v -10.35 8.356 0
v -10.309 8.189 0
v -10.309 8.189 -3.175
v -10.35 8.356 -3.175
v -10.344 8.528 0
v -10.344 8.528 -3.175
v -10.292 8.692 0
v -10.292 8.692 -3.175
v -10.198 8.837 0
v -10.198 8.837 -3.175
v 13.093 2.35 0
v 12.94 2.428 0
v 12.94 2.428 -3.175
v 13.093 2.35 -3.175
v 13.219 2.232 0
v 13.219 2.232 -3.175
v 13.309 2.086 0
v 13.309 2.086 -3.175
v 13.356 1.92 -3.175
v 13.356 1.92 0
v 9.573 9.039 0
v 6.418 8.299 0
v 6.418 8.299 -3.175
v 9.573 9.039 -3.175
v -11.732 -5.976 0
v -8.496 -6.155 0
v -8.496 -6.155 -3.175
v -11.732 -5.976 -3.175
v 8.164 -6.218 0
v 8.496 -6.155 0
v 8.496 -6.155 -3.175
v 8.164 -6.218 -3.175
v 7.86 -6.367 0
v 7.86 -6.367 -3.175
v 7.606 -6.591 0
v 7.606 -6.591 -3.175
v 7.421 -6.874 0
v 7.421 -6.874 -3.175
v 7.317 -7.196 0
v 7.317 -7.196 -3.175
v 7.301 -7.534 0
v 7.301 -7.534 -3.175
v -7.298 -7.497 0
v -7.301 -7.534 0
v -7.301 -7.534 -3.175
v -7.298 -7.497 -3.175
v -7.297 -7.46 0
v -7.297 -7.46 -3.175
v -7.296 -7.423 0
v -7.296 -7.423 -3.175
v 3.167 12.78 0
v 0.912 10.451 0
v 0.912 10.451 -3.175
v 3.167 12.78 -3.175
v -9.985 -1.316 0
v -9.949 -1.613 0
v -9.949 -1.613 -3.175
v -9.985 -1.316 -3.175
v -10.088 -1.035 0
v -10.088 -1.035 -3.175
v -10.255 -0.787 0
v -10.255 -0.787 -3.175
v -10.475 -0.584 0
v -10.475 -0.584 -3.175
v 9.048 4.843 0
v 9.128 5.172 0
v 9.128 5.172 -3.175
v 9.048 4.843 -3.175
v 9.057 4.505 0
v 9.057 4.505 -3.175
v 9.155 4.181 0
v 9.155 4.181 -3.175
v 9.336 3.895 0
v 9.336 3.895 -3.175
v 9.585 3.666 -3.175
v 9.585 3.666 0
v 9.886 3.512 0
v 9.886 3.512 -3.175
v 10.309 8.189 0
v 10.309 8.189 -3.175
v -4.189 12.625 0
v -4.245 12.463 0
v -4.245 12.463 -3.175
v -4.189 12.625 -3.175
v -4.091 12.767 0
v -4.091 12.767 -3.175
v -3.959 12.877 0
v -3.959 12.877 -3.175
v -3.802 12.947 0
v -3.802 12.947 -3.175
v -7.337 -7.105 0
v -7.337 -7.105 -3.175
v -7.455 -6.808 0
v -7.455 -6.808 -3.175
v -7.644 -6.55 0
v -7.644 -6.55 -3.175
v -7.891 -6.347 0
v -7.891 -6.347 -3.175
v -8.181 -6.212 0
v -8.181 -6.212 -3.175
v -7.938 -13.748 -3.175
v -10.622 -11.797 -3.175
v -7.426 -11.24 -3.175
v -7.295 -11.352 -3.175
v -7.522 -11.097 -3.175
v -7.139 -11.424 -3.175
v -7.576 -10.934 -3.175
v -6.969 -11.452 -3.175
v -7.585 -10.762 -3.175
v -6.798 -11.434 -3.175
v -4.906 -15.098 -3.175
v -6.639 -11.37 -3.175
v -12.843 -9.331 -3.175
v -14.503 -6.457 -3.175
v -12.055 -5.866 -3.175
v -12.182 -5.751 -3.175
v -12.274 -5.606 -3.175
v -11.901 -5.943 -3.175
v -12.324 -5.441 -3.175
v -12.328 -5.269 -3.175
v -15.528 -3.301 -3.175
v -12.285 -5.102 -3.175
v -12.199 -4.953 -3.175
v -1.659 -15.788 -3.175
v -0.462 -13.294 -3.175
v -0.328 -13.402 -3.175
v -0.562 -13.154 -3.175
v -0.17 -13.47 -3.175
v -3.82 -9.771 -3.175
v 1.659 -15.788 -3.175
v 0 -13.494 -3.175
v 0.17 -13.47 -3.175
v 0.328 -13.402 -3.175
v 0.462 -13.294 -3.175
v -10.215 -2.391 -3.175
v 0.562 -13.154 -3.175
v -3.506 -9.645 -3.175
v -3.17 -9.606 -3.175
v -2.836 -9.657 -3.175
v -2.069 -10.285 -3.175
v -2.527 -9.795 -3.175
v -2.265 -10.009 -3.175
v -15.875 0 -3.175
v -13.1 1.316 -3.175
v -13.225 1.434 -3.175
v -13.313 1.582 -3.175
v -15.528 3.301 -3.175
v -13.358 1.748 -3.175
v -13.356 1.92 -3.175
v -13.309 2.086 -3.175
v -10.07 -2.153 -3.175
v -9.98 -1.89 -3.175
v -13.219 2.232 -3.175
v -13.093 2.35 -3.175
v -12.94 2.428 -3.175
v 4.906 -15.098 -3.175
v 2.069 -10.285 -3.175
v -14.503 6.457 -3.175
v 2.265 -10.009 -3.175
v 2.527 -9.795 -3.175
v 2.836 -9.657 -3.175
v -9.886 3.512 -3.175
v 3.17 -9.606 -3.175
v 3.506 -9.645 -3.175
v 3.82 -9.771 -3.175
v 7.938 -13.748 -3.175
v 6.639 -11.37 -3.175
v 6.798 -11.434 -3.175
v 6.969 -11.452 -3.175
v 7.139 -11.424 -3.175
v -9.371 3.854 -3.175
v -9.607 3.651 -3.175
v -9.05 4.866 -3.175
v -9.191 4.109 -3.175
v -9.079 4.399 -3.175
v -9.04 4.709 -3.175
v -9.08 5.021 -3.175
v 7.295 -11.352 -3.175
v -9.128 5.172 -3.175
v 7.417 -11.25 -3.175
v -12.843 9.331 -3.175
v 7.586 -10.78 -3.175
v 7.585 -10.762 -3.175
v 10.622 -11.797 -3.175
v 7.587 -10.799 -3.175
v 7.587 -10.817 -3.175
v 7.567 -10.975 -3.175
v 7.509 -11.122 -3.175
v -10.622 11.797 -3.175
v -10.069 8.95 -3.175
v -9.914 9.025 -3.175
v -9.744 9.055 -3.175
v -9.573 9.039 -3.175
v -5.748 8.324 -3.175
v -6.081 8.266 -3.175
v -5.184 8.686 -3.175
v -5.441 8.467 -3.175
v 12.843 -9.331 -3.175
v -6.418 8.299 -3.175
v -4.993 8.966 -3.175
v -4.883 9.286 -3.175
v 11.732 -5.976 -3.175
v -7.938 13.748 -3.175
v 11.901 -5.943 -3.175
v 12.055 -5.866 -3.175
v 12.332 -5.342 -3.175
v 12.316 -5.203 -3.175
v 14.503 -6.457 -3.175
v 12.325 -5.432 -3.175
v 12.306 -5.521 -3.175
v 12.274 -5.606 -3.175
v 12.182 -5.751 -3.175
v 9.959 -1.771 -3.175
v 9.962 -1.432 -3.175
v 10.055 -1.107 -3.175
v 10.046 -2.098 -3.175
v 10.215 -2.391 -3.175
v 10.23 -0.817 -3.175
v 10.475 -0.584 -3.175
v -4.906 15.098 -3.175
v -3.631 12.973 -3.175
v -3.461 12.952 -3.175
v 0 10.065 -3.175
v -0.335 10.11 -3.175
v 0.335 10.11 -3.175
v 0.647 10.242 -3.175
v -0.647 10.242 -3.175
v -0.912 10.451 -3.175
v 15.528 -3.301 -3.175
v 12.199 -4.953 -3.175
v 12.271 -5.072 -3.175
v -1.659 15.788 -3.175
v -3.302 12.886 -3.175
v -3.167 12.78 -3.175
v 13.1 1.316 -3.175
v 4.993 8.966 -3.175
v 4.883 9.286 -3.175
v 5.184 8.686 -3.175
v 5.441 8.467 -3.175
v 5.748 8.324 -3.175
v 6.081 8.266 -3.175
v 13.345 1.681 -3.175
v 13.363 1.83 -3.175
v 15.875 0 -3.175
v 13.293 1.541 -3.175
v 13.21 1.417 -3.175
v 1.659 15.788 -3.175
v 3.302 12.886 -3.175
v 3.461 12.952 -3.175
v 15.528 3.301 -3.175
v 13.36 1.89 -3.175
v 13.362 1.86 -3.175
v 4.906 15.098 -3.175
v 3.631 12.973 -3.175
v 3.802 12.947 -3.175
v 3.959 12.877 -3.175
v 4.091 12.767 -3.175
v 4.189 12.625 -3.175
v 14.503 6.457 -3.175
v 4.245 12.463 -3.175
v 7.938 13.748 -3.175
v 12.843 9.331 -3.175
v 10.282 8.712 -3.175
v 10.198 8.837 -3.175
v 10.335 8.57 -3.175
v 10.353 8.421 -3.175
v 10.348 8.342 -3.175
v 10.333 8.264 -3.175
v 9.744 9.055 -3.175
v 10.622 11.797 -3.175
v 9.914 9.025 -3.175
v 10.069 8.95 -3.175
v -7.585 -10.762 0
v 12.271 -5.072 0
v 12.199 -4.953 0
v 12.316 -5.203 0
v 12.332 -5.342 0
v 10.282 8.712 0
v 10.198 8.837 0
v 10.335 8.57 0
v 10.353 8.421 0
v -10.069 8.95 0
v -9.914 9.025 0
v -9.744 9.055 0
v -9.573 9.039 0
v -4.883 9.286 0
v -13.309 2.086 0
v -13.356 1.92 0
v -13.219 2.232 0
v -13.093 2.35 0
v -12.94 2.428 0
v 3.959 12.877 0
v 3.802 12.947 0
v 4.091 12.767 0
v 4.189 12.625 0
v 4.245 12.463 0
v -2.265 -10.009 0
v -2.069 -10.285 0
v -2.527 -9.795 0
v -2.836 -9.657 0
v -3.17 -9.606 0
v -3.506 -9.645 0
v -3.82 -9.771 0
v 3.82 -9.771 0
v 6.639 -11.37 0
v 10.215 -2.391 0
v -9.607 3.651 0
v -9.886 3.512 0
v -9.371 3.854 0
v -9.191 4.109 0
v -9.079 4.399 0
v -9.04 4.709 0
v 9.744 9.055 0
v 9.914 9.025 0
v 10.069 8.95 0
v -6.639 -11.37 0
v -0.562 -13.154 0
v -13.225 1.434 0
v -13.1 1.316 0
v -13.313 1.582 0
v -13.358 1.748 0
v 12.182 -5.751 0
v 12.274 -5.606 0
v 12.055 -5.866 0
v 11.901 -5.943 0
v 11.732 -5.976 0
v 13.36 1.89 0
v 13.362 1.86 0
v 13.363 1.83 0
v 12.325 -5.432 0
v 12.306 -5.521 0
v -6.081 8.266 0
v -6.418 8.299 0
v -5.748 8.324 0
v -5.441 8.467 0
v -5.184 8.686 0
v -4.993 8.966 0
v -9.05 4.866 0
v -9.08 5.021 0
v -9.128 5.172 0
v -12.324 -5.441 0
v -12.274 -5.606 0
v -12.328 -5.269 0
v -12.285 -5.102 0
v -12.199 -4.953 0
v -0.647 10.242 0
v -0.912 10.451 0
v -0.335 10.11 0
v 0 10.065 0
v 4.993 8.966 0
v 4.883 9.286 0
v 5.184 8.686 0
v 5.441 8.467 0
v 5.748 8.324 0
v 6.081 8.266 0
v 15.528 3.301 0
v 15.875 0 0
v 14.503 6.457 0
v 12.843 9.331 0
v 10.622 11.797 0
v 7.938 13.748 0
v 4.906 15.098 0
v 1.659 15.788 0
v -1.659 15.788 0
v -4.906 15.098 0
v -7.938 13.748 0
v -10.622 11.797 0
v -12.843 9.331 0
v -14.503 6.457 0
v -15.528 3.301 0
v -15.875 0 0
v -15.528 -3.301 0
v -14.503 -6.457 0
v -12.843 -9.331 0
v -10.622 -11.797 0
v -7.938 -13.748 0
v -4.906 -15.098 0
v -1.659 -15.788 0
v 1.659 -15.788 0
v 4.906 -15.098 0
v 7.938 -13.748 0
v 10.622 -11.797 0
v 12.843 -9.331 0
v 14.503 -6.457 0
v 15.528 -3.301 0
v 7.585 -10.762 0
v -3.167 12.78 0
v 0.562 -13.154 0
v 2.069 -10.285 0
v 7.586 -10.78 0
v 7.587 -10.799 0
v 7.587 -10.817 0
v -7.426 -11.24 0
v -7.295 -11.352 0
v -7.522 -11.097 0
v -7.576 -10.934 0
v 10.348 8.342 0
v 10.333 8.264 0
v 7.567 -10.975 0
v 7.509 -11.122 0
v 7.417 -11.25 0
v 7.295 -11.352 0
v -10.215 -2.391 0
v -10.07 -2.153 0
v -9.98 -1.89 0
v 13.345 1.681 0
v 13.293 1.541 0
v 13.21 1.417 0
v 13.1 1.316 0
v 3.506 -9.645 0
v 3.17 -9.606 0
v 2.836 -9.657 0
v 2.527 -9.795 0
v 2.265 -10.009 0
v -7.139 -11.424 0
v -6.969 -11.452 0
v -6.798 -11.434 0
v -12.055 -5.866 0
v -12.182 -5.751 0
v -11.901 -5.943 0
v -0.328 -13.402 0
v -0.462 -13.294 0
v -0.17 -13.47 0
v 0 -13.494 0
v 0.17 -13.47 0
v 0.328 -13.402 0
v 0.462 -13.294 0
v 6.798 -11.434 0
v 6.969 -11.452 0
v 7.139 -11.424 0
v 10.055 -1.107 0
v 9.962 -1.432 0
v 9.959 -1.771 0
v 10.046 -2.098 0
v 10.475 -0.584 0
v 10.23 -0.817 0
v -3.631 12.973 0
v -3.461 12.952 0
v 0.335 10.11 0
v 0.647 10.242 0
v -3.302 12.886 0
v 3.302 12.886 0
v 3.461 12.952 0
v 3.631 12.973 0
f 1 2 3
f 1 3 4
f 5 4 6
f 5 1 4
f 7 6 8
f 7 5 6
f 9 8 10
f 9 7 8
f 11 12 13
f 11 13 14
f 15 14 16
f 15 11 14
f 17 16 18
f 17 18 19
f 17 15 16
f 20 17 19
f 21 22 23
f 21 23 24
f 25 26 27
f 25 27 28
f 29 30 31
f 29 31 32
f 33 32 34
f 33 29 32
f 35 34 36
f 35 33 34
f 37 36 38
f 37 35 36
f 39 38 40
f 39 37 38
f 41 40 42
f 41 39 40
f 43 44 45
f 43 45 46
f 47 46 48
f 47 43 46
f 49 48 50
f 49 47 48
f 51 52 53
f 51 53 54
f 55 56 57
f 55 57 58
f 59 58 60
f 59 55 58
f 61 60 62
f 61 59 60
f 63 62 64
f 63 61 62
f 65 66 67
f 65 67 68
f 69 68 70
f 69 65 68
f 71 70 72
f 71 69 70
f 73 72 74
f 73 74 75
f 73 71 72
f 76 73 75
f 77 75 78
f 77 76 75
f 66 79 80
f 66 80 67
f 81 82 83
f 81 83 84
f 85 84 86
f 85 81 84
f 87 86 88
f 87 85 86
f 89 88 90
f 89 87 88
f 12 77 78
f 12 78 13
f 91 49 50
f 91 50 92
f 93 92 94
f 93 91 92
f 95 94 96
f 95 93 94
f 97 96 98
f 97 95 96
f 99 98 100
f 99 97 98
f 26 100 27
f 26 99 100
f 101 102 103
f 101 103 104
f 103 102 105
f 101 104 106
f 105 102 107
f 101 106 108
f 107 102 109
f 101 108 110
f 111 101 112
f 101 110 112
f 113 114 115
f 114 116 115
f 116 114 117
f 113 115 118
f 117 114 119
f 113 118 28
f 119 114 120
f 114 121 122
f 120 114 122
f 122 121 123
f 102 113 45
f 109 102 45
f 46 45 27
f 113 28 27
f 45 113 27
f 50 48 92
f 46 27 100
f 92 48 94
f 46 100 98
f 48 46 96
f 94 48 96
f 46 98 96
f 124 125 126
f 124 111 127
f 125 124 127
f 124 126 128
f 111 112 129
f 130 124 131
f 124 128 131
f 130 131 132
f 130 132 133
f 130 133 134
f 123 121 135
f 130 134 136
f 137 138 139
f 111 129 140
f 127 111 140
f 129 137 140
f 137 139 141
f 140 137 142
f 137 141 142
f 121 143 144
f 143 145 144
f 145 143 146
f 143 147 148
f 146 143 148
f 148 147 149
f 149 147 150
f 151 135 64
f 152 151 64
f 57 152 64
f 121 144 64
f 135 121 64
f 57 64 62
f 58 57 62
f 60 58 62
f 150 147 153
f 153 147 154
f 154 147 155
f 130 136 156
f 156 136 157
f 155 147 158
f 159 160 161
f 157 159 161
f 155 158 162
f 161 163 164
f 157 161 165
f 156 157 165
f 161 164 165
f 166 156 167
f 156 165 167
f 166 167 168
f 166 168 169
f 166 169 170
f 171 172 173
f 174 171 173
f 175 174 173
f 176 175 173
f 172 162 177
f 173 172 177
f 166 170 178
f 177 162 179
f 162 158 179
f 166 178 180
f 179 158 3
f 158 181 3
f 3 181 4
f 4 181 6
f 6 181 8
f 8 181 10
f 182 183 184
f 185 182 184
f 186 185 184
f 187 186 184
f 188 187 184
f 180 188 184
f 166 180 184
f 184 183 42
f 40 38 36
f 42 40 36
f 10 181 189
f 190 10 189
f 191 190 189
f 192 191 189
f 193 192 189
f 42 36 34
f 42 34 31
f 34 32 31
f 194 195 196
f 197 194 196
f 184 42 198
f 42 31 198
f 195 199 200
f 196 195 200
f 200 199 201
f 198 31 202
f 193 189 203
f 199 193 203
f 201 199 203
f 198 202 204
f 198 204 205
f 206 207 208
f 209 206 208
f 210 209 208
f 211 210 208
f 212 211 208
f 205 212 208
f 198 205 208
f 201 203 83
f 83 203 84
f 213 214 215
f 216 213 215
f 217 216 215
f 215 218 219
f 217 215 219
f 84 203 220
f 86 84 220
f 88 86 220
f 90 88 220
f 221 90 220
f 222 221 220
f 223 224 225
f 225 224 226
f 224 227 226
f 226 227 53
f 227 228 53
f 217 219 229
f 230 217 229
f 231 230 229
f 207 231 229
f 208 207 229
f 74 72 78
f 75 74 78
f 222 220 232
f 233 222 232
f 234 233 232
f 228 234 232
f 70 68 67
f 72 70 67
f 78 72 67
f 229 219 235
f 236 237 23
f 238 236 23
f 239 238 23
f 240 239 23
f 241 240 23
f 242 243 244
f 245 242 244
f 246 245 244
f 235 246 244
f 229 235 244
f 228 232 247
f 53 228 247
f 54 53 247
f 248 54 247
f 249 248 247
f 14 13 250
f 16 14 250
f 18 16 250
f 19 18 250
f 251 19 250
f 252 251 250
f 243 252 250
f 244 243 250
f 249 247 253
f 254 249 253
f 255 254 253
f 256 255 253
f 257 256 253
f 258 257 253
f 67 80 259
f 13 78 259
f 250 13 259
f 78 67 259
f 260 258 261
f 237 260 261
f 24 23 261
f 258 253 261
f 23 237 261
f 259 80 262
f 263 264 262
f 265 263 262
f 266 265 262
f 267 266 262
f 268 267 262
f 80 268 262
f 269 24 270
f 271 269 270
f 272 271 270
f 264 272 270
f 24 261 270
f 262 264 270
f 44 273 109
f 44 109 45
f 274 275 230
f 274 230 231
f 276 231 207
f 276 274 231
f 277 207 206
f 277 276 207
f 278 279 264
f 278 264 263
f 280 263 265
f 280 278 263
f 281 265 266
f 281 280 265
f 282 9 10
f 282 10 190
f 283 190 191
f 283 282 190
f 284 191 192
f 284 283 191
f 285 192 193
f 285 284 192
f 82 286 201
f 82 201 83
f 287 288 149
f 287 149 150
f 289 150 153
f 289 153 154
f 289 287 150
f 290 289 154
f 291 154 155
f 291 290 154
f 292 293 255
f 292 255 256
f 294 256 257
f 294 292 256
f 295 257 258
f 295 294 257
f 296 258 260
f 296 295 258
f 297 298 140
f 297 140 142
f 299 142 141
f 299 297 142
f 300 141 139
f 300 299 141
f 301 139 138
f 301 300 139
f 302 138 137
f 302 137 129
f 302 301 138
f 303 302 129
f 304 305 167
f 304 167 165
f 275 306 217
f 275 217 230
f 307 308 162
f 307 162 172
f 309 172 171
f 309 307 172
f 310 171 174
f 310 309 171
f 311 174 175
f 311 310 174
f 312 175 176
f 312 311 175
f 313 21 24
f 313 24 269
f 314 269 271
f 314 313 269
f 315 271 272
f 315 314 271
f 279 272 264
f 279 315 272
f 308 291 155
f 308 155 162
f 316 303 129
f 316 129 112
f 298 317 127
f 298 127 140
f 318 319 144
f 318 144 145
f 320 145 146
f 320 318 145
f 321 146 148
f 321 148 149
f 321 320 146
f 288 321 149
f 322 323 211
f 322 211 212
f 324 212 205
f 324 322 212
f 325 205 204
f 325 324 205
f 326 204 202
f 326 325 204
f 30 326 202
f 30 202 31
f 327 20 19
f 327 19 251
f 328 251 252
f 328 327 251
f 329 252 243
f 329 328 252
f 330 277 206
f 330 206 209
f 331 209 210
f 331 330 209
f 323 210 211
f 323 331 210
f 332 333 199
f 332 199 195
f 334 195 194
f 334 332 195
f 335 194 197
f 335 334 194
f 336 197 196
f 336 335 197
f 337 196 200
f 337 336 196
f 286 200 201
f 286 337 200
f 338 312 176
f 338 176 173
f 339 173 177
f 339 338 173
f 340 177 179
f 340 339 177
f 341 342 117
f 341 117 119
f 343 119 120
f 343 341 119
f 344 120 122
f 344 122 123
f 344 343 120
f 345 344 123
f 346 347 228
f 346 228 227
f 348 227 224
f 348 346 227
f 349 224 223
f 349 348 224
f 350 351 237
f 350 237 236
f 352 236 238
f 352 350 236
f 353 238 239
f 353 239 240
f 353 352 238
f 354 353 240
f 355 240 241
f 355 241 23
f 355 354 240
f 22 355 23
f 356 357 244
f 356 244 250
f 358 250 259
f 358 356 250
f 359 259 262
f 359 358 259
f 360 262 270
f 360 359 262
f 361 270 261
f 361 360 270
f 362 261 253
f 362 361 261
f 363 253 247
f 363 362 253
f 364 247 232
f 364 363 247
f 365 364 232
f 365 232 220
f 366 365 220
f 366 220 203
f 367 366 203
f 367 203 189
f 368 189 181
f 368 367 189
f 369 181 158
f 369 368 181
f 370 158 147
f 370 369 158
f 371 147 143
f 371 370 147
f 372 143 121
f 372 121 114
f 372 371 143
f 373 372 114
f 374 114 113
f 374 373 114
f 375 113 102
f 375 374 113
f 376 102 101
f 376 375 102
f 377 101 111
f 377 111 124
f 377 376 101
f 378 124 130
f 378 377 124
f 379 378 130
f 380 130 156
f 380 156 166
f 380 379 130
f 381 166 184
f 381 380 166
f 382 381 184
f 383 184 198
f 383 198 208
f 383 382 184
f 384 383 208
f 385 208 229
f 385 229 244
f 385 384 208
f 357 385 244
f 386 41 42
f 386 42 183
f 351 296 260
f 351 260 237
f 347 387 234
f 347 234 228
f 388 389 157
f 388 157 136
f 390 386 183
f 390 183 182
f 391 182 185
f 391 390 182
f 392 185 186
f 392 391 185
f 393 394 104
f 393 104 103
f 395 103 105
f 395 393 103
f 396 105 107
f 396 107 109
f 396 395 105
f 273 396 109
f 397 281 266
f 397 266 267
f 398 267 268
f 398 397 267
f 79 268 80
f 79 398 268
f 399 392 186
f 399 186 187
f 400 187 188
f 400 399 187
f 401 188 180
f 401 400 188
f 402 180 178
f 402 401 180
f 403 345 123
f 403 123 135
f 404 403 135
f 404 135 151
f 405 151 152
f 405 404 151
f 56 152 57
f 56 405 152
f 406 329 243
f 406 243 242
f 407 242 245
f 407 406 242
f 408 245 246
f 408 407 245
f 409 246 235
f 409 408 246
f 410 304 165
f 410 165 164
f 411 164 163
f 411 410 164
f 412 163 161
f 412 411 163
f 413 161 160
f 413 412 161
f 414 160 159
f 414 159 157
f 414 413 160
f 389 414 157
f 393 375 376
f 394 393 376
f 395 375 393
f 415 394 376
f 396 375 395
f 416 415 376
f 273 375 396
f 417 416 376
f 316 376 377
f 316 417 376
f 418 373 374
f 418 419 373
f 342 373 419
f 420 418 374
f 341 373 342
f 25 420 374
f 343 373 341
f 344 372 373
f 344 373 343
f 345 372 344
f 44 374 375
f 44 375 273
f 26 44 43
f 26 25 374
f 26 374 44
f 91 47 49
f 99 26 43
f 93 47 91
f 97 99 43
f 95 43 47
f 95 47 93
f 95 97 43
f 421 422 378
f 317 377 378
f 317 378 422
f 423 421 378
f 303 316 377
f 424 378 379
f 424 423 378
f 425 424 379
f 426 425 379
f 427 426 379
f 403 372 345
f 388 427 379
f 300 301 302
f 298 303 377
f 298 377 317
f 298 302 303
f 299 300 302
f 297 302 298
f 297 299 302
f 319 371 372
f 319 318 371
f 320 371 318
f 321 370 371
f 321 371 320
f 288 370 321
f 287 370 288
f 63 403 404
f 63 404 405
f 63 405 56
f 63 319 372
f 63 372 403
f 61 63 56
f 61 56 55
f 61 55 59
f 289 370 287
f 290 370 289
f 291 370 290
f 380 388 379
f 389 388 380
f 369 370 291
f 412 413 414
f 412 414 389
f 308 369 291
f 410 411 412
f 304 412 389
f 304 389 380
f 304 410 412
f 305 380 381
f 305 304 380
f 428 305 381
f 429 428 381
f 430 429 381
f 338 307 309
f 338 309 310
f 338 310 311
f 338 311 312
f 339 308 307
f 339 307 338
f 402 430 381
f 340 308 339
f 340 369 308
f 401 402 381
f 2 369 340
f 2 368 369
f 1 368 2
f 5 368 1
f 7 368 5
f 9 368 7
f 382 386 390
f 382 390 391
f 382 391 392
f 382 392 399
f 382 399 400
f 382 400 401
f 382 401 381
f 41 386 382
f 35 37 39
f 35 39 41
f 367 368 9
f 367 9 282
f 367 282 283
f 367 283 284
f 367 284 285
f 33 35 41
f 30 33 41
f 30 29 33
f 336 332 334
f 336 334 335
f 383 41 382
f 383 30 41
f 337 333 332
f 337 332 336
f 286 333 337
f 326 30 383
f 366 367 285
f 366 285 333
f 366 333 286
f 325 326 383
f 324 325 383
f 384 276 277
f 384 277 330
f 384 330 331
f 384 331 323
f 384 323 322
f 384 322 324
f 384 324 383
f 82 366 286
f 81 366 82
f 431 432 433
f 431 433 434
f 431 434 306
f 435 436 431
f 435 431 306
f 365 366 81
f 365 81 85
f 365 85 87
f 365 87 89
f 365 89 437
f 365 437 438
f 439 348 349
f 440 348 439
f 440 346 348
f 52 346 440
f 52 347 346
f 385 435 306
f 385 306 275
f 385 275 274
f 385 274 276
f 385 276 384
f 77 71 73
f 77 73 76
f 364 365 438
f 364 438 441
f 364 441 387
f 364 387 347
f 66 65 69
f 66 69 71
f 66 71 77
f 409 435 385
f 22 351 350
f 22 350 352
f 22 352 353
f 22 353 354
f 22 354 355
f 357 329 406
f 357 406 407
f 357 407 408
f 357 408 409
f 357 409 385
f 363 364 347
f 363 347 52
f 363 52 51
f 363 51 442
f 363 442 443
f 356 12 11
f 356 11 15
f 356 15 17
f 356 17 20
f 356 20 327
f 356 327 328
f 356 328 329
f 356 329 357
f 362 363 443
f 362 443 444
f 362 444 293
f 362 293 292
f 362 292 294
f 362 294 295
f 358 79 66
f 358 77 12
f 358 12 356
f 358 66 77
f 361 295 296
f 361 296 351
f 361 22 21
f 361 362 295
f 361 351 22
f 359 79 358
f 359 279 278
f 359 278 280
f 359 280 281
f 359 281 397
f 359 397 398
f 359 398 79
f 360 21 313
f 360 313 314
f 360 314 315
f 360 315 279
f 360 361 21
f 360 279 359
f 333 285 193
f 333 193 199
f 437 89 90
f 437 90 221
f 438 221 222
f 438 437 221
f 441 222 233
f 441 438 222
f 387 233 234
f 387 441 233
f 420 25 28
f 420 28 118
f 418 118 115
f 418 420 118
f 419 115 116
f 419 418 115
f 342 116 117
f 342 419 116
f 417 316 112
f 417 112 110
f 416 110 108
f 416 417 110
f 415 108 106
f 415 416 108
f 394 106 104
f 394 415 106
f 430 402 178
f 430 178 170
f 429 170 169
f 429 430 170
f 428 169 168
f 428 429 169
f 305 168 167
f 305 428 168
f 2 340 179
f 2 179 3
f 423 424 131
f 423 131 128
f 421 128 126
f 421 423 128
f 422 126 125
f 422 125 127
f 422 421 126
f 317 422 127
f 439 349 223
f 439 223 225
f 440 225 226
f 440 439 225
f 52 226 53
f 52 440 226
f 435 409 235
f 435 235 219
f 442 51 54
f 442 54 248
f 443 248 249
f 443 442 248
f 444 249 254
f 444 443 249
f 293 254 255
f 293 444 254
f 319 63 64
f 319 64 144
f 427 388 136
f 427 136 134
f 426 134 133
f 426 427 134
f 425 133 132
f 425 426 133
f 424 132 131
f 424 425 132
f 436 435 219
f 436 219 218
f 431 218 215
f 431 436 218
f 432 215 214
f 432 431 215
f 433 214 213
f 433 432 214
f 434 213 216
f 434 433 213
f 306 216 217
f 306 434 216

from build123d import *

# Parameters (mm, degrees)
F0_R     = 15.875
F1_DEPTH = 3.175


with BuildPart() as f1:
    # F0 (on Top) → F1 (new body)
    with BuildSketch(Plane.XY):
        Circle(F0_R)
        with BuildLine():
            ThreePointArc((0, 13.49375), (1.920361, 13.356403), (3.801629, 12.947158))
            ThreePointArc((3.801629, 12.947158), (7.295272, 11.351665), (10.197896, 8.836527))
            ThreePointArc((10.197896, 8.836527), (12.274347, 5.605506), (13.356403, 1.920361))
            ThreePointArc((13.356403, 1.920361), (13.459369, 0.962633), (13.49375, 0))
            ThreePointArc((13.49375, 0), (13.185376, -2.868303), (12.274347, -5.605506))
            ThreePointArc((12.274347, -5.605506), (10.197896, -8.836527), (7.295272, -11.351665))
            ThreePointArc((7.295272, -11.351665), (3.801629, -12.947158), (0, -13.49375))
            ThreePointArc((0, -13.49375), (-3.801629, -12.947158), (-7.295272, -11.351665))
            ThreePointArc((-7.295272, -11.351665), (-10.197896, -8.836527), (-12.274347, -5.605506))
            ThreePointArc((-12.274347, -5.605506), (-13.356403, -1.920361), (-13.356403, 1.920361))
            ThreePointArc((-13.356403, 1.920361), (-12.274347, 5.605506), (-10.197896, 8.836527))
            ThreePointArc((-10.197896, 8.836527), (-7.295272, 11.351665), (-3.801629, 12.947158))
            ThreePointArc((-3.801629, 12.947158), (-1.920361, 13.356403), (0, 13.49375))
        make_face(mode=Mode.SUBTRACT)
        with BuildLine():
            ThreePointArc((-4.245319, 12.462805), (-4.090966, 12.766808), (-3.801629, 12.947158))
            ThreePointArc((-3.801629, 12.947158), (-7.295272, 11.351665), (-10.197896, 8.836527))
            ThreePointArc((-10.197896, 8.836527), (-9.913648, 9.024797), (-9.572997, 9.038914))
            Line((-9.572997, 9.038914), (-6.418023, 8.298951))
            ThreePointArc((-6.418023, 8.298951), (-6.916891, 10.530686), (-4.858029, 9.535398))
            ThreePointArc((-4.858029, 9.535398), (-4.864249, 9.409858), (-4.882848, 9.285548))
            Line((-4.882848, 9.285548), (-4.245319, 12.462805))
        make_face()
        with BuildLine():
            ThreePointArc((-6.418023, 8.298951), (-5.441415, 8.467007), (-4.882848, 9.285548))
            ThreePointArc((-4.882848, 9.285548), (-4.864249, 9.409858), (-4.858029, 9.535398))
            ThreePointArc((-4.858029, 9.535398), (-6.916891, 10.530686), (-6.418023, 8.298951))
        make_face()
        with BuildLine():
            ThreePointArc((-13.100136, 1.315559), (-13.312545, 1.58225), (-13.356403, 1.920361))
            ThreePointArc((-13.356403, 1.920361), (-13.356403, -1.920361), (-12.274347, -5.605506))
            ThreePointArc((-12.274347, -5.605506), (-12.327522, -5.268735), (-12.198852, -4.953004))
            Line((-12.198852, -4.953004), (-10.215134, -2.390531))
            ThreePointArc((-10.215134, -2.390531), (-12.476452, -1.793843), (-10.47484, -0.584239))
            Line((-10.47484, -0.584239), (-13.100136, 1.315559))
        make_face()
        with BuildLine():
            ThreePointArc((-9.949379, -1.613103), (-10.088347, -1.035463), (-10.47484, -0.584239))
            ThreePointArc((-10.47484, -0.584239), (-12.476452, -1.793843), (-10.215134, -2.390531))
            ThreePointArc((-10.215134, -2.390531), (-10.017653, -2.023901), (-9.949379, -1.613103))
        make_face()
        with BuildLine():
            ThreePointArc((-10.309291, 8.189186), (-10.343797, 8.528379), (-10.197896, 8.836527))
            ThreePointArc((-10.197896, 8.836527), (-12.274347, 5.605506), (-13.356403, 1.920361))
            ThreePointArc((-13.356403, 1.920361), (-13.219065, 2.232419), (-12.940124, 2.428465))
            Line((-12.940124, 2.428465), (-9.885936, 3.511676))
            ThreePointArc((-9.885936, 3.511676), (-11.465684, 5.236202), (-9.127859, 5.171633))
            Line((-9.127859, 5.171633), (-10.309291, 8.189186))
        make_face()
        with BuildLine():
            ThreePointArc((-9.040451, 4.708625), (-9.062495, 4.944219), (-9.127859, 5.171633))
            ThreePointArc((-9.127859, 5.171633), (-11.465684, 5.236202), (-9.885936, 3.511676))
            ThreePointArc((-9.885936, 3.511676), (-9.273139, 3.975902), (-9.040451, 4.708625))
        make_face()
        with BuildLine():
            Line((0, 12.60475), (0, 13.49375))
            ThreePointArc((0, 13.49375), (-1.920361, 13.356403), (-3.801629, 12.947158))
            ThreePointArc((-3.801629, 12.947158), (-3.460718, 12.951865), (-3.166512, 12.779572))
            Line((-3.166512, 12.779572), (-0.912433, 10.451367))
            ThreePointArc((-0.912433, 10.451367), (-1.169358, 11.830231), (0, 12.60475))
        make_face()
        with BuildLine():
            ThreePointArc((1.27, 11.33475), (0.898026, 12.232776), (0, 12.60475))
            Line((0, 12.60475), (0, 10.06475))
            ThreePointArc((0, 10.06475), (0.495481, 10.165392), (0.912433, 10.451367))
            ThreePointArc((0.912433, 10.451367), (1.177219, 10.858247), (1.27, 11.33475))
        make_face()
        with BuildLine():
            ThreePointArc((3.166512, 12.779572), (3.460718, 12.951865), (3.801629, 12.947158))
            ThreePointArc((3.801629, 12.947158), (1.920361, 13.356403), (0, 13.49375))
            Line((0, 13.49375), (0, 12.60475))
            ThreePointArc((0, 12.60475), (0.898026, 12.232776), (1.27, 11.33475))
            ThreePointArc((1.27, 11.33475), (1.177219, 10.858247), (0.912433, 10.451367))
            Line((0.912433, 10.451367), (3.166512, 12.779572))
        make_face()
        with BuildLine():
            Line((0, 10.06475), (0, 12.60475))
            ThreePointArc((0, 12.60475), (-1.169358, 11.830231), (-0.912433, 10.451367))
            ThreePointArc((-0.912433, 10.451367), (-0.495481, 10.165392), (0, 10.06475))
        make_face()
        with BuildLine():
            ThreePointArc((10.197896, 8.836527), (7.295272, 11.351665), (3.801629, 12.947158))
            ThreePointArc((3.801629, 12.947158), (4.090966, 12.766808), (4.245319, 12.462805))
            Line((4.245319, 12.462805), (4.882848, 9.285548))
            ThreePointArc((4.882848, 9.285548), (6.002488, 10.799178), (7.398029, 9.535398))
            ThreePointArc((7.398029, 9.535398), (7.123316, 8.746536), (6.418023, 8.298951))
            Line((6.418023, 8.298951), (9.572997, 9.038914))
            ThreePointArc((9.572997, 9.038914), (9.913648, 9.024797), (10.197896, 8.836527))
        make_face()
        with BuildLine():
            ThreePointArc((7.398029, 9.535398), (6.002488, 10.799178), (4.882848, 9.285548))
            ThreePointArc((4.882848, 9.285548), (5.441415, 8.467006), (6.418023, 8.298951))
            ThreePointArc((6.418023, 8.298951), (7.123316, 8.746536), (7.398029, 9.535398))
        make_face()
        with BuildLine():
            ThreePointArc((13.356403, 1.920361), (12.274347, 5.605506), (10.197896, 8.836527))
            ThreePointArc((10.197896, 8.836527), (10.312958, 8.6426), (10.352995, 8.420691))
            ThreePointArc((10.352995, 8.420691), (10.341973, 8.302894), (10.309291, 8.189187))
            Line((10.309291, 8.189187), (9.127859, 5.171633))
            ThreePointArc((9.127859, 5.171633), (10.546044, 5.956582), (11.580451, 4.708625))
            ThreePointArc((11.580451, 4.708625), (11.043174, 3.671313), (9.885936, 3.511676))
            Line((9.885936, 3.511676), (12.940124, 2.428466))
            ThreePointArc((12.940124, 2.428466), (13.219065, 2.23242), (13.356403, 1.920361))
        make_face()
        with BuildLine():
            ThreePointArc((9.127859, 5.171633), (9.155219, 4.181048), (9.885936, 3.511676))
            ThreePointArc((9.885936, 3.511676), (11.043174, 3.671313), (11.580451, 4.708625))
            ThreePointArc((11.580451, 4.708625), (10.546044, 5.956582), (9.127859, 5.171633))
        make_face()
        with BuildLine():
            ThreePointArc((13.49375, 0), (13.459369, 0.962633), (13.356403, 1.920361))
            ThreePointArc((13.356403, 1.920361), (13.361249, 1.875291), (13.362866, 1.829991))
            ThreePointArc((13.362866, 1.829991), (13.293382, 1.541171), (13.100136, 1.315559))
            Line((13.100136, 1.315559), (10.47484, -0.584239))
            ThreePointArc((10.47484, -0.584239), (11.797019, -0.482072), (12.489379, -1.613103))
            ThreePointArc((12.489379, -1.613103), (11.630177, -2.814829), (10.215134, -2.390531))
            Line((10.215134, -2.390531), (12.198853, -4.953004))
            ThreePointArc((12.198853, -4.953004), (12.297593, -5.136319), (12.33173, -5.341718))
            ThreePointArc((12.33173, -5.341718), (12.317219, -5.476697), (12.274347, -5.605506))
            ThreePointArc((12.274347, -5.605506), (13.185376, -2.868303), (13.49375, 0))
        make_face()
        with BuildLine():
            ThreePointArc((12.489379, -1.613103), (11.797019, -0.482072), (10.47484, -0.584239))
            ThreePointArc((10.47484, -0.584239), (9.962305, -1.432363), (10.215134, -2.390531))
            ThreePointArc((10.215134, -2.390531), (11.630177, -2.814829), (12.489379, -1.613103))
        make_face()
        with BuildLine():
            ThreePointArc((7.295272, -11.351665), (10.197896, -8.836527), (12.274347, -5.605506))
            ThreePointArc((12.274347, -5.605506), (12.054655, -5.866232), (11.73178, -5.97575))
            Line((11.73178, -5.97575), (8.496133, -6.154619))
            ThreePointArc((8.496133, -6.154619), (9.439122, -6.500206), (9.836232, -7.422683))
            ThreePointArc((9.836232, -7.422683), (8.621825, -8.691465), (7.301099, -7.533761))
            Line((7.301099, -7.533761), (7.584532, -10.76193))
            ThreePointArc((7.584532, -10.76193), (7.586357, -10.789673), (7.586965, -10.817469))
            ThreePointArc((7.586965, -10.817469), (7.509291, -11.121792), (7.295272, -11.351665))
        make_face()
        with BuildLine():
            ThreePointArc((9.836232, -7.422683), (9.439122, -6.500206), (8.496133, -6.154619))
            ThreePointArc((8.496133, -6.154619), (7.606431, -6.59101), (7.301099, -7.533761))
            ThreePointArc((7.301099, -7.533761), (8.621825, -8.691465), (9.836232, -7.422683))
        make_face()
        with BuildLine():
            ThreePointArc((0, -13.49375), (3.801629, -12.947158), (7.295272, -11.351665))
            ThreePointArc((7.295272, -11.351665), (6.969497, -11.452227), (6.638667, -11.3698))
            Line((6.638667, -11.3698), (3.819964, -9.770951))
            ThreePointArc((3.819964, -9.770951), (4.290792, -10.236425), (4.463368, -10.875613))
            ThreePointArc((4.463368, -10.875613), (2.889251, -12.108663), (2.069017, -10.285075))
            Line((2.069017, -10.285075), (0.562176, -13.154019))
            ThreePointArc((0.562176, -13.154019), (0.328428, -13.402221), (0, -13.49375))
        make_face()
        with BuildLine():
            ThreePointArc((4.463368, -10.875613), (4.290792, -10.236425), (3.819964, -9.770951))
            ThreePointArc((3.819964, -9.770951), (2.835568, -9.657057), (2.069017, -10.285075))
            ThreePointArc((2.069017, -10.285075), (2.889251, -12.108663), (4.463368, -10.875613))
        make_face()
        with BuildLine():
            ThreePointArc((-6.638667, -11.3698), (-6.969497, -11.452227), (-7.295272, -11.351665))
            ThreePointArc((-7.295272, -11.351665), (-3.801629, -12.947158), (0, -13.49375))
            ThreePointArc((0, -13.49375), (-0.328427, -13.402221), (-0.562175, -13.154019))
            Line((-0.562175, -13.154019), (-2.069017, -10.285075))
            ThreePointArc((-2.069017, -10.285075), (-1.960318, -10.571496), (-1.923368, -10.875613))
            ThreePointArc((-1.923368, -10.875613), (-3.832556, -11.973036), (-3.819964, -9.770951))
            Line((-3.819964, -9.770951), (-6.638667, -11.3698))
        make_face()
        with BuildLine():
            ThreePointArc((-2.069017, -10.285075), (-2.835568, -9.657057), (-3.819964, -9.770951))
            ThreePointArc((-3.819964, -9.770951), (-3.832556, -11.973036), (-1.923368, -10.875613))
            ThreePointArc((-1.923368, -10.875613), (-1.960318, -10.571496), (-2.069017, -10.285075))
        make_face()
        with BuildLine():
            ThreePointArc((-11.73178, -5.97575), (-12.054655, -5.866232), (-12.274347, -5.605506))
            ThreePointArc((-12.274347, -5.605506), (-10.197896, -8.836527), (-7.295272, -11.351665))
            ThreePointArc((-7.295272, -11.351665), (-7.522078, -11.097104), (-7.584532, -10.76193))
            Line((-7.584532, -10.76193), (-7.301099, -7.533761))
            ThreePointArc((-7.301099, -7.533761), (-9.526034, -8.254356), (-8.496133, -6.154619))
            Line((-8.496133, -6.154619), (-11.73178, -5.97575))
        make_face()
        with BuildLine():
            ThreePointArc((-7.296232, -7.422683), (-7.643756, -6.549793), (-8.496133, -6.154619))
            ThreePointArc((-8.496133, -6.154619), (-9.526034, -8.254356), (-7.301099, -7.533761))
            ThreePointArc((-7.301099, -7.533761), (-7.29745, -7.478275), (-7.296232, -7.422683))
        make_face()
    extrude(amount=-F1_DEPTH)


solid = f1.part
